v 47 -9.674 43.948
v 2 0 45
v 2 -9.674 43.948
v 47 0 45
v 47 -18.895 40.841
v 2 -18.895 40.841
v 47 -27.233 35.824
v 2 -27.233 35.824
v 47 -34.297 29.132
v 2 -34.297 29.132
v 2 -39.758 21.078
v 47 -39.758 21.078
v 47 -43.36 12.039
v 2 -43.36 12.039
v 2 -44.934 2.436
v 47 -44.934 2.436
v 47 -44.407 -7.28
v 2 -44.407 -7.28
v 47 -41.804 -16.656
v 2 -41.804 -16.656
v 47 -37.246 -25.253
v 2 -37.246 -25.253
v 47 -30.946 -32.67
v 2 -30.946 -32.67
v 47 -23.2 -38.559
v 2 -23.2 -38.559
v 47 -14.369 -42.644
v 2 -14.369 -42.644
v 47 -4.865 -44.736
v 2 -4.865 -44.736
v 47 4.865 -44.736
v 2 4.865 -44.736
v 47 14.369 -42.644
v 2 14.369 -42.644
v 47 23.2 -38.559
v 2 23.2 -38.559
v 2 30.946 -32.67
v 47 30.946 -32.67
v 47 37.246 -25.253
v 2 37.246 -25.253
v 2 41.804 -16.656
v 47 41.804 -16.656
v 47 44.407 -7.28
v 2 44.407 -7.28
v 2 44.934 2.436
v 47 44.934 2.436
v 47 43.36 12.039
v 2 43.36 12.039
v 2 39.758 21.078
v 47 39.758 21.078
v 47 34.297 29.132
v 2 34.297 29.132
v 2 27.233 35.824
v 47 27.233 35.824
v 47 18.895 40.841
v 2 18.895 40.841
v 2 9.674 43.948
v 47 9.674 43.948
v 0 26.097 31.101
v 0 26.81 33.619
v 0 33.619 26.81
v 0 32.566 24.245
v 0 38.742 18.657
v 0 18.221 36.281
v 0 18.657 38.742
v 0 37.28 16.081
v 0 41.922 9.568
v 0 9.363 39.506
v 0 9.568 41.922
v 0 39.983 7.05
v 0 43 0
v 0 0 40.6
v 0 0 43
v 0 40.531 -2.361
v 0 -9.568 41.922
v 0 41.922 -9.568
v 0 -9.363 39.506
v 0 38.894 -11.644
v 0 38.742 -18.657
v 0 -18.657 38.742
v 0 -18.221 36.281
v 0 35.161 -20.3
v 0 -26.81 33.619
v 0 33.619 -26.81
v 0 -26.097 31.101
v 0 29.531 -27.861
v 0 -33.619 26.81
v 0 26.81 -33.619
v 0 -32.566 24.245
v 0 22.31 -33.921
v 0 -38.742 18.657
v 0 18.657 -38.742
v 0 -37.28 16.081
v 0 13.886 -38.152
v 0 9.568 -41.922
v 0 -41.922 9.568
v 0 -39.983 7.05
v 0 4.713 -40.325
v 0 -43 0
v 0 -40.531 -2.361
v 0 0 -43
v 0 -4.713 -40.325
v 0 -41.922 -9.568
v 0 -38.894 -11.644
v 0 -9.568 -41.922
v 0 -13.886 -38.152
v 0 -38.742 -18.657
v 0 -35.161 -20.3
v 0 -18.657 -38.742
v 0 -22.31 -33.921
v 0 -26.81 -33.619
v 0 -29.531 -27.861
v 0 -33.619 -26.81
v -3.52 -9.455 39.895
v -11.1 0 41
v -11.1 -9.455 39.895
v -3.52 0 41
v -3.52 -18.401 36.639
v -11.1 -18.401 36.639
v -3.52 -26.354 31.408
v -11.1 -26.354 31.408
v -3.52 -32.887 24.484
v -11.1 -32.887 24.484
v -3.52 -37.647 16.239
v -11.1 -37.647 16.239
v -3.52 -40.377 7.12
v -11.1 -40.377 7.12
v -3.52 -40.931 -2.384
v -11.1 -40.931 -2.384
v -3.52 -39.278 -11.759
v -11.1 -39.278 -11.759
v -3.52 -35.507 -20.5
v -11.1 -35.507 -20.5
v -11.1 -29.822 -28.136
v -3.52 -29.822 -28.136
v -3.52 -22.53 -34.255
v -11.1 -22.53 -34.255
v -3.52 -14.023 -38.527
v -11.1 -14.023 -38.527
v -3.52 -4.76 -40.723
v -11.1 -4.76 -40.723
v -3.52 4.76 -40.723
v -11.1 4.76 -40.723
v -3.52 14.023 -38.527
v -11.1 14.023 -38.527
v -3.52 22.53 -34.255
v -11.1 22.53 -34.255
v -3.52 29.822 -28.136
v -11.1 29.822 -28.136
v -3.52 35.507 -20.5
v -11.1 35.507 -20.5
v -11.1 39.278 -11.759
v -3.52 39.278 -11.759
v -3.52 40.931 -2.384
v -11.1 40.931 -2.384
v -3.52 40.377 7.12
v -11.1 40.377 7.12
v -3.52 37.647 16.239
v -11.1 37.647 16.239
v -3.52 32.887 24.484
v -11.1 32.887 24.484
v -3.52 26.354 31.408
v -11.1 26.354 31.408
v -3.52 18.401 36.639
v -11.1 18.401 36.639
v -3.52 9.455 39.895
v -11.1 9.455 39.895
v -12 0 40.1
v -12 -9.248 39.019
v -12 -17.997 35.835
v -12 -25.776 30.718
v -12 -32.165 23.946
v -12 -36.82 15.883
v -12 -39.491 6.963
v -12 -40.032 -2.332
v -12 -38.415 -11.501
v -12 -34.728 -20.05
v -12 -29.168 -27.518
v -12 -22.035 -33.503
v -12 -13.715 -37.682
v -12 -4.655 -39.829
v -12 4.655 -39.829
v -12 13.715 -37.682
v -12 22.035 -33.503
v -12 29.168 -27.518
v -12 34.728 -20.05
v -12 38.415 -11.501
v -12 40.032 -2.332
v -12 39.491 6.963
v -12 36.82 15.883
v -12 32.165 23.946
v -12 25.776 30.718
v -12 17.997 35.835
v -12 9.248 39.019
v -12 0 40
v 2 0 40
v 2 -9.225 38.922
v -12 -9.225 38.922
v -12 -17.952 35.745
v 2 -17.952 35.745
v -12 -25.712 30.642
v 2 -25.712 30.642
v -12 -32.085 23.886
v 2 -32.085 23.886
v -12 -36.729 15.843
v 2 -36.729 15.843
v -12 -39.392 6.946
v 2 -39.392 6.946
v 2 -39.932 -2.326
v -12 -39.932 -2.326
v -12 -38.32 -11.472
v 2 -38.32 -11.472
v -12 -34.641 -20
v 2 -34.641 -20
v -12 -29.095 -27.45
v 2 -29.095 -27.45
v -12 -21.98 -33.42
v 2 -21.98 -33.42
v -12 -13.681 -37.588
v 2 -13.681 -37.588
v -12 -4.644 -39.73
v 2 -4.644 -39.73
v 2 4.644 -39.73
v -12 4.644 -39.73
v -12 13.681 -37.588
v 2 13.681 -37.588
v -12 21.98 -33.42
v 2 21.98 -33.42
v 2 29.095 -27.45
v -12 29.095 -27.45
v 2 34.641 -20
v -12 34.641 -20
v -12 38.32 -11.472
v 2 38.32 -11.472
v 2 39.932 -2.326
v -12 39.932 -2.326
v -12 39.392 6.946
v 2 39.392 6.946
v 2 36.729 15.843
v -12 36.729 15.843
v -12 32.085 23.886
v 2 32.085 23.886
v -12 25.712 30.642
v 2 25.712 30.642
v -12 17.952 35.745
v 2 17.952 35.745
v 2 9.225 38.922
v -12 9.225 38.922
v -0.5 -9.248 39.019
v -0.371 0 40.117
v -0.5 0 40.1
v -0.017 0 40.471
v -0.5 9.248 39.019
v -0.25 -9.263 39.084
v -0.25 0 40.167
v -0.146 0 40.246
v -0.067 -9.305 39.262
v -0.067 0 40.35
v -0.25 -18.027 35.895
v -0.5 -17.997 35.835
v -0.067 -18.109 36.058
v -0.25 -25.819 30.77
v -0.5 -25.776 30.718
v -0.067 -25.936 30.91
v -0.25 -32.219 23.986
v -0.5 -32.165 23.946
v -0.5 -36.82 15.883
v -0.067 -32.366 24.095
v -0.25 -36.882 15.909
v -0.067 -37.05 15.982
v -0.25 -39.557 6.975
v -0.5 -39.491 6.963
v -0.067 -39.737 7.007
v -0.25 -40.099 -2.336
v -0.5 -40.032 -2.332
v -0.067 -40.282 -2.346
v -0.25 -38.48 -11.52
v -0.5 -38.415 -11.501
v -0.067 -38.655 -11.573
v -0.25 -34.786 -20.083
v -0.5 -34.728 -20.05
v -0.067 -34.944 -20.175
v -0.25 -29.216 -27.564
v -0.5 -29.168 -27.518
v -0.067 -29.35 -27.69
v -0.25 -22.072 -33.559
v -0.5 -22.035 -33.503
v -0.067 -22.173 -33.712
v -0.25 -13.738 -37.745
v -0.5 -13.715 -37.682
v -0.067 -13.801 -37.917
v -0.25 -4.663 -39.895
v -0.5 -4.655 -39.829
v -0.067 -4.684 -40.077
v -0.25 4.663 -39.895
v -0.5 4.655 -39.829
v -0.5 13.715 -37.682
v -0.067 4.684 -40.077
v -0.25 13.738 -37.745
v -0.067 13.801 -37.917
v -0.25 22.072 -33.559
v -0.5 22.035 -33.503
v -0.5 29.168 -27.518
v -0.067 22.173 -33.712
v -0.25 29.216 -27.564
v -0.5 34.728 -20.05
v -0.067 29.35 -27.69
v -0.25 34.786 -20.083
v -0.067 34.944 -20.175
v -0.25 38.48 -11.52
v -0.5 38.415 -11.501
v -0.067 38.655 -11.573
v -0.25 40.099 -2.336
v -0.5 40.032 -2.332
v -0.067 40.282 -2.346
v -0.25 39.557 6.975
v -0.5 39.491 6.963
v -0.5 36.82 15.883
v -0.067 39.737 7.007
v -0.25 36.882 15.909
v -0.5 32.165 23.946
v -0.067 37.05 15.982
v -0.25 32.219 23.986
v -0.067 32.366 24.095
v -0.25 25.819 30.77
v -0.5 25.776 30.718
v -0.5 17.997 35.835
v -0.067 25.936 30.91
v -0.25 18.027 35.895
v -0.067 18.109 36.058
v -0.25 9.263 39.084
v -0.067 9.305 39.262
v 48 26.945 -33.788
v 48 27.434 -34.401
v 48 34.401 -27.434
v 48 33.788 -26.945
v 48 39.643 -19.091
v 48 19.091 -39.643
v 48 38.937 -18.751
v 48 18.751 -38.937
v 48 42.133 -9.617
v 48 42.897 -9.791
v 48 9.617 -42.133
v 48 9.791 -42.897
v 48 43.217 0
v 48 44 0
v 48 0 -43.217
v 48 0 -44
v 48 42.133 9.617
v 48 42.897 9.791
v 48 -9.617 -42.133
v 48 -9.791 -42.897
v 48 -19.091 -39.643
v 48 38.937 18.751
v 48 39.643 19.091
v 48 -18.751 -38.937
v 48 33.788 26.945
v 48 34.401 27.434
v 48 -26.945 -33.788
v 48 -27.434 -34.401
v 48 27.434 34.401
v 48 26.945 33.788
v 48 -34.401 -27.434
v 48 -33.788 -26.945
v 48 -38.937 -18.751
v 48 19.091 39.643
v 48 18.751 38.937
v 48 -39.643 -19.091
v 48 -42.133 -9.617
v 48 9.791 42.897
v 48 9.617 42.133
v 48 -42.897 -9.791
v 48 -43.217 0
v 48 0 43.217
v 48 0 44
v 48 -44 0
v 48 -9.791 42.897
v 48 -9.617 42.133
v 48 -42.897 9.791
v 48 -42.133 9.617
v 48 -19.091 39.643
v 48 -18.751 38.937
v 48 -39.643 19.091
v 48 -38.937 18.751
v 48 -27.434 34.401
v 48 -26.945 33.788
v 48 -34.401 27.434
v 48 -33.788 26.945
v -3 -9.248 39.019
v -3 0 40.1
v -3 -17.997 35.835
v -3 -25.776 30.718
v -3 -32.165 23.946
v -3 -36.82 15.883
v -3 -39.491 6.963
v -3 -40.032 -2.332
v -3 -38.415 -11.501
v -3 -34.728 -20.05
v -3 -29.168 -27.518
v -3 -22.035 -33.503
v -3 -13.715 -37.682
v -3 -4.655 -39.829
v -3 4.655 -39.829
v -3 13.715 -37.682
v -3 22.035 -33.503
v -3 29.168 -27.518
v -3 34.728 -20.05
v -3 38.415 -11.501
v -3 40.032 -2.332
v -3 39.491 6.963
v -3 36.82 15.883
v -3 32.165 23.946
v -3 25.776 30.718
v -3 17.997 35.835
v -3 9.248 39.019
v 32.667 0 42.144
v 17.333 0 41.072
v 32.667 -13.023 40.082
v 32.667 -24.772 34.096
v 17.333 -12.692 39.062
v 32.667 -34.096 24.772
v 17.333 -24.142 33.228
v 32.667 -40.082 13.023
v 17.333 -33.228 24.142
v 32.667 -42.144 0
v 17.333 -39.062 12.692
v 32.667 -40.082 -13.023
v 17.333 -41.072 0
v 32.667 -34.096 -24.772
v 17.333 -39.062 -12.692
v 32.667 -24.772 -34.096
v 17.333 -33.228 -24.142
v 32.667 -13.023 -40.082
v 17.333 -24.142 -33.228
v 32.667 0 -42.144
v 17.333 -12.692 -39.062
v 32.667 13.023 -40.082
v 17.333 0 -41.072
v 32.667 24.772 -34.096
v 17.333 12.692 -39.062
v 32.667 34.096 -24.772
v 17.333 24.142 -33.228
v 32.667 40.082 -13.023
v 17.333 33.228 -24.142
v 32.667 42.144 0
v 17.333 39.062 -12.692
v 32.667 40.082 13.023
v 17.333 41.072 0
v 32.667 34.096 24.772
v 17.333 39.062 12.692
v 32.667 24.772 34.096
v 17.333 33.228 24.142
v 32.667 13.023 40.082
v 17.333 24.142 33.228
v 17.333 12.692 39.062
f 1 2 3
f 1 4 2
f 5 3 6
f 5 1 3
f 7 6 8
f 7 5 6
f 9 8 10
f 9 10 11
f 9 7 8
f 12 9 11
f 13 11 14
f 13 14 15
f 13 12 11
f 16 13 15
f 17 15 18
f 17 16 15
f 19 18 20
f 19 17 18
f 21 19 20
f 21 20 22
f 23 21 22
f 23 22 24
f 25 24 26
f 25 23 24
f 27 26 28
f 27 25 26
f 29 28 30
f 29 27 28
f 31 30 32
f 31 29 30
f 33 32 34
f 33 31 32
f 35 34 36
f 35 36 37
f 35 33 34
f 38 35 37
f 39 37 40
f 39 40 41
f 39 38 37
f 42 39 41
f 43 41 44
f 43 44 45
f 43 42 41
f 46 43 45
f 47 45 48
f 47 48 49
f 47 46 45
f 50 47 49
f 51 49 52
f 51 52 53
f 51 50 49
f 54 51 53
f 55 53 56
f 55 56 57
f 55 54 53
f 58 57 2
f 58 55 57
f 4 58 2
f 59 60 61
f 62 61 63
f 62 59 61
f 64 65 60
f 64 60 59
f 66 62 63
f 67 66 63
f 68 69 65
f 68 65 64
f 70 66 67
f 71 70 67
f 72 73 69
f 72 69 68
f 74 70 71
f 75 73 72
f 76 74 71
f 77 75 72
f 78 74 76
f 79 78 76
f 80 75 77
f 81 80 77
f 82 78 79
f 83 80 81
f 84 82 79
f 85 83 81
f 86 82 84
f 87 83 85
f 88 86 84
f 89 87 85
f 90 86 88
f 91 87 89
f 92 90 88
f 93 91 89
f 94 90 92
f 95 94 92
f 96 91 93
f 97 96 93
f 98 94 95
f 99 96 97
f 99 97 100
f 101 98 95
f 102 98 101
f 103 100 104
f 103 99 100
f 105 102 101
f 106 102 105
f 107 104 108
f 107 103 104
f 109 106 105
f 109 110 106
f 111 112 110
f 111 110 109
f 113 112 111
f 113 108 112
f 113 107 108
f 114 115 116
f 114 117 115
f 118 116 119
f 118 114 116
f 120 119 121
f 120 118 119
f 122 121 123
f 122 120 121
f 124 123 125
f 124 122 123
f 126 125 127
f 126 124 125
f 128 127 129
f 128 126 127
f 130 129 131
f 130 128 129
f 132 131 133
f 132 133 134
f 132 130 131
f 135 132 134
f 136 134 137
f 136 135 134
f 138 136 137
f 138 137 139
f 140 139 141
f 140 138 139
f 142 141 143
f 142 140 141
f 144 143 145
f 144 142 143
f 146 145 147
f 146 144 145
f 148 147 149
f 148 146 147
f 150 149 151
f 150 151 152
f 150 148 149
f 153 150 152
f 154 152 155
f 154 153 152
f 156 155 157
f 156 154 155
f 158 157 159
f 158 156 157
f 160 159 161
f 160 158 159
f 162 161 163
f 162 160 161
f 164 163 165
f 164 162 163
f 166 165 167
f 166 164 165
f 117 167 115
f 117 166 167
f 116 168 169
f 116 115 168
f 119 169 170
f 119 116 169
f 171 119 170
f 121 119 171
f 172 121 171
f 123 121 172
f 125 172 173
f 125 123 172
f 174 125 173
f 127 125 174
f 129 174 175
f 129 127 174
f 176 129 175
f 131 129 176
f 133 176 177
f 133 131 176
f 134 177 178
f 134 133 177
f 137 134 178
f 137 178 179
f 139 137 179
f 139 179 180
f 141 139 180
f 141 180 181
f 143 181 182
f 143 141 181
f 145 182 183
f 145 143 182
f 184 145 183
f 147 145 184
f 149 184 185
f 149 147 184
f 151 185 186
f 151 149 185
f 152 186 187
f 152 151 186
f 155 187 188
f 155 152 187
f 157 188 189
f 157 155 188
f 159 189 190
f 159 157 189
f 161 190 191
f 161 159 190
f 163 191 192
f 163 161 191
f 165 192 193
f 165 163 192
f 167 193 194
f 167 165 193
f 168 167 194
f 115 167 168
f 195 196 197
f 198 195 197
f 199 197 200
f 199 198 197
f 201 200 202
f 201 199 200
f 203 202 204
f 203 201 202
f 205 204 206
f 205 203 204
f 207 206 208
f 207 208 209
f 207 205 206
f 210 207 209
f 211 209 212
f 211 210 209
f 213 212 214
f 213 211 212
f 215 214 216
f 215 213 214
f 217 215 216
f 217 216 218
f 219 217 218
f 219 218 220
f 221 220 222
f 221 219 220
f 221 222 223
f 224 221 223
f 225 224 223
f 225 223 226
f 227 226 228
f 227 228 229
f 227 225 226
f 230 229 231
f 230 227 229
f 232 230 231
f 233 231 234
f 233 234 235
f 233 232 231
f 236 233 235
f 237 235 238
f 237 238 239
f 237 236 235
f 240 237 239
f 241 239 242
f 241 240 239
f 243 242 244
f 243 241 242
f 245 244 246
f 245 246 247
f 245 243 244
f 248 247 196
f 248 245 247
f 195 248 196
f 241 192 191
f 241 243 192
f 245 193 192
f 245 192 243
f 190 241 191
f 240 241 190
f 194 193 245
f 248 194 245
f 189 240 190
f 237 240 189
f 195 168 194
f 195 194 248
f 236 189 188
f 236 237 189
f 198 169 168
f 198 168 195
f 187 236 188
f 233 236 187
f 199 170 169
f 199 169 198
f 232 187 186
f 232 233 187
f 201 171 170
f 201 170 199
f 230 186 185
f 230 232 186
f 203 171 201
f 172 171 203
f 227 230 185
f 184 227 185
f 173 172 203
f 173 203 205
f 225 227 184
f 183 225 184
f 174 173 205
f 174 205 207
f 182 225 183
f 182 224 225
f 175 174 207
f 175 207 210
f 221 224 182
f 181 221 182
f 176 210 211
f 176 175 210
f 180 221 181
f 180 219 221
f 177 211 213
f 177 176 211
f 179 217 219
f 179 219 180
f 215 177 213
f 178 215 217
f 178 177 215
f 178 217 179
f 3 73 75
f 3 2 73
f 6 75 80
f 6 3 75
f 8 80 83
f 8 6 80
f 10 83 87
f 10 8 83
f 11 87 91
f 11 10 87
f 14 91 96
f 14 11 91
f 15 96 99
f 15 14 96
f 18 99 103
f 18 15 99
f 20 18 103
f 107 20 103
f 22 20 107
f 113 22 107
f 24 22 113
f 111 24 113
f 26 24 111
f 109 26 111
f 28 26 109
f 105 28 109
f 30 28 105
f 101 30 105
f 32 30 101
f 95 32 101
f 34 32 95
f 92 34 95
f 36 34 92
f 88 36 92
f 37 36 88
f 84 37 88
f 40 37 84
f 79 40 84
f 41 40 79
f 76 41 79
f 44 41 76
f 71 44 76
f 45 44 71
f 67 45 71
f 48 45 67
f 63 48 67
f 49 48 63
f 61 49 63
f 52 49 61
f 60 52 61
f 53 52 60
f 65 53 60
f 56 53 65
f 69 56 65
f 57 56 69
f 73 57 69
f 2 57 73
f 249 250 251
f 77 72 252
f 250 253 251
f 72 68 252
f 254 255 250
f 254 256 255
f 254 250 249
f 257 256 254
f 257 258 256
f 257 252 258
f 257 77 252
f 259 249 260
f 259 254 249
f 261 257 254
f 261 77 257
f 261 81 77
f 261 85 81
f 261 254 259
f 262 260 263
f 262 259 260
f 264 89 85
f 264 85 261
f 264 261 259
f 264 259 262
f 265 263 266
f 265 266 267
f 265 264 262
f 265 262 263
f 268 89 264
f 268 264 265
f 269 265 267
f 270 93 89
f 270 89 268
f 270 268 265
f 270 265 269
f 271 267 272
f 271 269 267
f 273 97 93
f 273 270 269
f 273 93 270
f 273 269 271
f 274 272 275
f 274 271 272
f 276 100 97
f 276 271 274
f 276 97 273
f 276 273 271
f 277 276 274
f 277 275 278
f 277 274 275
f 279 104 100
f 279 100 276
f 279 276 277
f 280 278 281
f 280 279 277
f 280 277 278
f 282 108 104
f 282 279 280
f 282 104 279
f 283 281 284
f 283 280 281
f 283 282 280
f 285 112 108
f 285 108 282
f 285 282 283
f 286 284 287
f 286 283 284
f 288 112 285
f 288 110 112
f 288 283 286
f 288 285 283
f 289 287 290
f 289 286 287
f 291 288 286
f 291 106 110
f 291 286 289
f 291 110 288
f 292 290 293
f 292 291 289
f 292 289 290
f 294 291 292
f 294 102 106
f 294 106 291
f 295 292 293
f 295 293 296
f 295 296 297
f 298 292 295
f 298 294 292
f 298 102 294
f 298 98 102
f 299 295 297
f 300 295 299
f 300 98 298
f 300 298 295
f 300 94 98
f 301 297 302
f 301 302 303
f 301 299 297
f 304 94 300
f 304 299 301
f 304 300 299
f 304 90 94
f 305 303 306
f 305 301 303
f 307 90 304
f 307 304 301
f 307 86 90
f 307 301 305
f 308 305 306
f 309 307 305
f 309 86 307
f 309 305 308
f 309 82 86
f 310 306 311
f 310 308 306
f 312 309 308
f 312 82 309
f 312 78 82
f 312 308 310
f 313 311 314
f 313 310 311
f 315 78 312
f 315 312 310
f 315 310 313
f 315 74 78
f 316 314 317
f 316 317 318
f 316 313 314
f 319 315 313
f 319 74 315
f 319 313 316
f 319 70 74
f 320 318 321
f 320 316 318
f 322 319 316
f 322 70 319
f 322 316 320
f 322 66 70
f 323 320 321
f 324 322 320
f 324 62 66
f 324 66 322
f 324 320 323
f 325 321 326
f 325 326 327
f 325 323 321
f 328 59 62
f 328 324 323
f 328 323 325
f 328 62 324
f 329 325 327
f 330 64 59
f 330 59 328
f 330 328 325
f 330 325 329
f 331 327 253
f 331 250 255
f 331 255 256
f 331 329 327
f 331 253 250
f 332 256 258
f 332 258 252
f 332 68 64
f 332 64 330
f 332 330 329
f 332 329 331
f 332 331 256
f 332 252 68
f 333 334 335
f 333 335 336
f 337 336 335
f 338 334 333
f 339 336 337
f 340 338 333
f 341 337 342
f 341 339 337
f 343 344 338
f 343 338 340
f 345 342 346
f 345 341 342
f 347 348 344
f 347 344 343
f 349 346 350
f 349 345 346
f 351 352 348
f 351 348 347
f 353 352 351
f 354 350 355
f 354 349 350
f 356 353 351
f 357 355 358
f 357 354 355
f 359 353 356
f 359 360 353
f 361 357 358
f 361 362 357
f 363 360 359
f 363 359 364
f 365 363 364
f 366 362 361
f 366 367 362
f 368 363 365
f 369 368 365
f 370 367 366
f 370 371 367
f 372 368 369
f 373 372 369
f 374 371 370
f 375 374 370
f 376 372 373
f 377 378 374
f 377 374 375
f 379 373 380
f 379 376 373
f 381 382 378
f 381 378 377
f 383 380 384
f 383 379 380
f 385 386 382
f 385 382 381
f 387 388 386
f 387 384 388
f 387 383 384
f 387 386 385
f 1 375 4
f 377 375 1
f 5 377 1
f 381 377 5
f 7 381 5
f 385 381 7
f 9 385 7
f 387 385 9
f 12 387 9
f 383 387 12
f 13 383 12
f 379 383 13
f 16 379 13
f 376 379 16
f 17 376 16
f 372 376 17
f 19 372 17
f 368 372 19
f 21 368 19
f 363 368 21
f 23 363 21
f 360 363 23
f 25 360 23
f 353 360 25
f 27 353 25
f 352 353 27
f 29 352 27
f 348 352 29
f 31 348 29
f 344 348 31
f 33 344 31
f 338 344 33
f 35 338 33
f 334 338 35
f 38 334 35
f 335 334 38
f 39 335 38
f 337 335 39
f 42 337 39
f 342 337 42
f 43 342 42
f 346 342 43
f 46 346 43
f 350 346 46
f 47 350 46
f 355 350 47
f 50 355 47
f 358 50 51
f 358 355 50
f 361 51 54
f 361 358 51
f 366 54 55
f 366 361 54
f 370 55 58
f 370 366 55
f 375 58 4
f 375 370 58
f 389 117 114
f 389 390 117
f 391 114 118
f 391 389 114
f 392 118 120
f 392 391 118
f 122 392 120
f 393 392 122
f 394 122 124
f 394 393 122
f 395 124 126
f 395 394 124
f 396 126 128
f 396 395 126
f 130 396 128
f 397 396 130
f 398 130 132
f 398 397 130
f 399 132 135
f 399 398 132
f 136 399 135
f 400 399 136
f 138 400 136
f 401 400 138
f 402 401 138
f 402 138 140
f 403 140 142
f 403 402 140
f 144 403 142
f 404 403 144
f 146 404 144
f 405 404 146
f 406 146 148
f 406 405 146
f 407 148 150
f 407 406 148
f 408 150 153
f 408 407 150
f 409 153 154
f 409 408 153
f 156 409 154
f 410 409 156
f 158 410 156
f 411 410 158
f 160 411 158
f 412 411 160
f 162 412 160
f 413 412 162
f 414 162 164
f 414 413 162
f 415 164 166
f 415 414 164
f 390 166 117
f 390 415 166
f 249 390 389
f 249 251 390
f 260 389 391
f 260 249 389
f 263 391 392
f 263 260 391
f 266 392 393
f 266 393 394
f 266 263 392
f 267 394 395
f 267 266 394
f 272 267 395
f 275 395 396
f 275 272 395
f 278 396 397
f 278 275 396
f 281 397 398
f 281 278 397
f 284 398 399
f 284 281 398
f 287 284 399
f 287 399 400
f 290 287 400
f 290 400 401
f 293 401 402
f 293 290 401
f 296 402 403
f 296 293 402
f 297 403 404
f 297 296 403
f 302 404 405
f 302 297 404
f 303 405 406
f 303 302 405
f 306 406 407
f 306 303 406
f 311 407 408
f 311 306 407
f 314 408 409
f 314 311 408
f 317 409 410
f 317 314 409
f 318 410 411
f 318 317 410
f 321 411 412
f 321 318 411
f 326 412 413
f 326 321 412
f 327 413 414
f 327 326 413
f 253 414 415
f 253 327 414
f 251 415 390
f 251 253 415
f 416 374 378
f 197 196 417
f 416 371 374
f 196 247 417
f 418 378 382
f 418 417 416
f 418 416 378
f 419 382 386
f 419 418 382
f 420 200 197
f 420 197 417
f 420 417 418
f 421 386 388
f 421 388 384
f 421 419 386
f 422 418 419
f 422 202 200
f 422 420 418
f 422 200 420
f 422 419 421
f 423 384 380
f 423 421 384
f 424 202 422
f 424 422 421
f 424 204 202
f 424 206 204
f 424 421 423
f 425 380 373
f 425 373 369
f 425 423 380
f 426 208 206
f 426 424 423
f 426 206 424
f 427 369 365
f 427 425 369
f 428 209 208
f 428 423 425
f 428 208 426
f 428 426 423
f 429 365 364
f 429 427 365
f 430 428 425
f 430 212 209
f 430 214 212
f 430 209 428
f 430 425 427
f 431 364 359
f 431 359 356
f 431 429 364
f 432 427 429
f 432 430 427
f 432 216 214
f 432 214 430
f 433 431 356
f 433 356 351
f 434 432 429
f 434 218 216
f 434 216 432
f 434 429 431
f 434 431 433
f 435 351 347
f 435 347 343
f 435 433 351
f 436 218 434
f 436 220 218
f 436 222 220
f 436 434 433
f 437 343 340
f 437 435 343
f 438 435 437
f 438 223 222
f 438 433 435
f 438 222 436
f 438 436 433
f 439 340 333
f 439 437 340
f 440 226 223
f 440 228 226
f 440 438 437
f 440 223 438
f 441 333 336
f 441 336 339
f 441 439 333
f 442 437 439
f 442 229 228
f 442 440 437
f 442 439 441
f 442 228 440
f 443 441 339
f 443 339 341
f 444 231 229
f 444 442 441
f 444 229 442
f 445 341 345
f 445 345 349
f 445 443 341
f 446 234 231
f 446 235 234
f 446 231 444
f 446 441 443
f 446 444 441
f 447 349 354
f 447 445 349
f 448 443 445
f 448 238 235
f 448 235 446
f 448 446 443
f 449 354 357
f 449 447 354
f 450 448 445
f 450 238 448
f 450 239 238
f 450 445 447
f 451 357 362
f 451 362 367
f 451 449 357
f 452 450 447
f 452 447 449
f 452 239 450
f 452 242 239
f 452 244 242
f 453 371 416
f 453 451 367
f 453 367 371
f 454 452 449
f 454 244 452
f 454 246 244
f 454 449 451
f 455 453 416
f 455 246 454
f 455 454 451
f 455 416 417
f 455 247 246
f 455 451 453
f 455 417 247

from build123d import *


with BuildPart() as part:
    # Esquisse1 → Révolution1 (revolve)
    with BuildSketch(Plane(origin=(0, 0, 0), x_dir=(1, 0, 0), z_dir=(0, 1, 0)), mode=Mode.PRIVATE) as r_volution1_sk:
        with BuildLine():
            Line((2, 40), (-12, 40))
            Line((-12, 40), (-12, 40.1))
            Line((-12, 40.1), (-11.1, 41))
            Line((-11.1, 41), (-3.519615242, 41))
            Line((-3.519615242, 41), (-3, 40.1))
            Line((-3, 40.1), (-0.5, 40.1))
            ThreePointArc((-0.5, 40.1), (-0.146446609, 40.246446609), (0, 40.6))
            Line((0, 40.6), (0, 43))
            Line((0, 43), (2, 45))
            Line((2, 45), (47, 45))
            Line((47, 45), (48, 44))
            Line((48, 44), (48, 43.216633349))
            Line((48, 43.216633349), (2, 40))
        make_face()
    revolve(r_volution1_sk.sketch.rotate(Axis((-32.094260439, 0, 0), (1, 0, 0)), 180), axis=Axis((-32.094260439, 0, 0), (1, 0, 0)))  # turned: the seam where the file's is


solid = part.part
